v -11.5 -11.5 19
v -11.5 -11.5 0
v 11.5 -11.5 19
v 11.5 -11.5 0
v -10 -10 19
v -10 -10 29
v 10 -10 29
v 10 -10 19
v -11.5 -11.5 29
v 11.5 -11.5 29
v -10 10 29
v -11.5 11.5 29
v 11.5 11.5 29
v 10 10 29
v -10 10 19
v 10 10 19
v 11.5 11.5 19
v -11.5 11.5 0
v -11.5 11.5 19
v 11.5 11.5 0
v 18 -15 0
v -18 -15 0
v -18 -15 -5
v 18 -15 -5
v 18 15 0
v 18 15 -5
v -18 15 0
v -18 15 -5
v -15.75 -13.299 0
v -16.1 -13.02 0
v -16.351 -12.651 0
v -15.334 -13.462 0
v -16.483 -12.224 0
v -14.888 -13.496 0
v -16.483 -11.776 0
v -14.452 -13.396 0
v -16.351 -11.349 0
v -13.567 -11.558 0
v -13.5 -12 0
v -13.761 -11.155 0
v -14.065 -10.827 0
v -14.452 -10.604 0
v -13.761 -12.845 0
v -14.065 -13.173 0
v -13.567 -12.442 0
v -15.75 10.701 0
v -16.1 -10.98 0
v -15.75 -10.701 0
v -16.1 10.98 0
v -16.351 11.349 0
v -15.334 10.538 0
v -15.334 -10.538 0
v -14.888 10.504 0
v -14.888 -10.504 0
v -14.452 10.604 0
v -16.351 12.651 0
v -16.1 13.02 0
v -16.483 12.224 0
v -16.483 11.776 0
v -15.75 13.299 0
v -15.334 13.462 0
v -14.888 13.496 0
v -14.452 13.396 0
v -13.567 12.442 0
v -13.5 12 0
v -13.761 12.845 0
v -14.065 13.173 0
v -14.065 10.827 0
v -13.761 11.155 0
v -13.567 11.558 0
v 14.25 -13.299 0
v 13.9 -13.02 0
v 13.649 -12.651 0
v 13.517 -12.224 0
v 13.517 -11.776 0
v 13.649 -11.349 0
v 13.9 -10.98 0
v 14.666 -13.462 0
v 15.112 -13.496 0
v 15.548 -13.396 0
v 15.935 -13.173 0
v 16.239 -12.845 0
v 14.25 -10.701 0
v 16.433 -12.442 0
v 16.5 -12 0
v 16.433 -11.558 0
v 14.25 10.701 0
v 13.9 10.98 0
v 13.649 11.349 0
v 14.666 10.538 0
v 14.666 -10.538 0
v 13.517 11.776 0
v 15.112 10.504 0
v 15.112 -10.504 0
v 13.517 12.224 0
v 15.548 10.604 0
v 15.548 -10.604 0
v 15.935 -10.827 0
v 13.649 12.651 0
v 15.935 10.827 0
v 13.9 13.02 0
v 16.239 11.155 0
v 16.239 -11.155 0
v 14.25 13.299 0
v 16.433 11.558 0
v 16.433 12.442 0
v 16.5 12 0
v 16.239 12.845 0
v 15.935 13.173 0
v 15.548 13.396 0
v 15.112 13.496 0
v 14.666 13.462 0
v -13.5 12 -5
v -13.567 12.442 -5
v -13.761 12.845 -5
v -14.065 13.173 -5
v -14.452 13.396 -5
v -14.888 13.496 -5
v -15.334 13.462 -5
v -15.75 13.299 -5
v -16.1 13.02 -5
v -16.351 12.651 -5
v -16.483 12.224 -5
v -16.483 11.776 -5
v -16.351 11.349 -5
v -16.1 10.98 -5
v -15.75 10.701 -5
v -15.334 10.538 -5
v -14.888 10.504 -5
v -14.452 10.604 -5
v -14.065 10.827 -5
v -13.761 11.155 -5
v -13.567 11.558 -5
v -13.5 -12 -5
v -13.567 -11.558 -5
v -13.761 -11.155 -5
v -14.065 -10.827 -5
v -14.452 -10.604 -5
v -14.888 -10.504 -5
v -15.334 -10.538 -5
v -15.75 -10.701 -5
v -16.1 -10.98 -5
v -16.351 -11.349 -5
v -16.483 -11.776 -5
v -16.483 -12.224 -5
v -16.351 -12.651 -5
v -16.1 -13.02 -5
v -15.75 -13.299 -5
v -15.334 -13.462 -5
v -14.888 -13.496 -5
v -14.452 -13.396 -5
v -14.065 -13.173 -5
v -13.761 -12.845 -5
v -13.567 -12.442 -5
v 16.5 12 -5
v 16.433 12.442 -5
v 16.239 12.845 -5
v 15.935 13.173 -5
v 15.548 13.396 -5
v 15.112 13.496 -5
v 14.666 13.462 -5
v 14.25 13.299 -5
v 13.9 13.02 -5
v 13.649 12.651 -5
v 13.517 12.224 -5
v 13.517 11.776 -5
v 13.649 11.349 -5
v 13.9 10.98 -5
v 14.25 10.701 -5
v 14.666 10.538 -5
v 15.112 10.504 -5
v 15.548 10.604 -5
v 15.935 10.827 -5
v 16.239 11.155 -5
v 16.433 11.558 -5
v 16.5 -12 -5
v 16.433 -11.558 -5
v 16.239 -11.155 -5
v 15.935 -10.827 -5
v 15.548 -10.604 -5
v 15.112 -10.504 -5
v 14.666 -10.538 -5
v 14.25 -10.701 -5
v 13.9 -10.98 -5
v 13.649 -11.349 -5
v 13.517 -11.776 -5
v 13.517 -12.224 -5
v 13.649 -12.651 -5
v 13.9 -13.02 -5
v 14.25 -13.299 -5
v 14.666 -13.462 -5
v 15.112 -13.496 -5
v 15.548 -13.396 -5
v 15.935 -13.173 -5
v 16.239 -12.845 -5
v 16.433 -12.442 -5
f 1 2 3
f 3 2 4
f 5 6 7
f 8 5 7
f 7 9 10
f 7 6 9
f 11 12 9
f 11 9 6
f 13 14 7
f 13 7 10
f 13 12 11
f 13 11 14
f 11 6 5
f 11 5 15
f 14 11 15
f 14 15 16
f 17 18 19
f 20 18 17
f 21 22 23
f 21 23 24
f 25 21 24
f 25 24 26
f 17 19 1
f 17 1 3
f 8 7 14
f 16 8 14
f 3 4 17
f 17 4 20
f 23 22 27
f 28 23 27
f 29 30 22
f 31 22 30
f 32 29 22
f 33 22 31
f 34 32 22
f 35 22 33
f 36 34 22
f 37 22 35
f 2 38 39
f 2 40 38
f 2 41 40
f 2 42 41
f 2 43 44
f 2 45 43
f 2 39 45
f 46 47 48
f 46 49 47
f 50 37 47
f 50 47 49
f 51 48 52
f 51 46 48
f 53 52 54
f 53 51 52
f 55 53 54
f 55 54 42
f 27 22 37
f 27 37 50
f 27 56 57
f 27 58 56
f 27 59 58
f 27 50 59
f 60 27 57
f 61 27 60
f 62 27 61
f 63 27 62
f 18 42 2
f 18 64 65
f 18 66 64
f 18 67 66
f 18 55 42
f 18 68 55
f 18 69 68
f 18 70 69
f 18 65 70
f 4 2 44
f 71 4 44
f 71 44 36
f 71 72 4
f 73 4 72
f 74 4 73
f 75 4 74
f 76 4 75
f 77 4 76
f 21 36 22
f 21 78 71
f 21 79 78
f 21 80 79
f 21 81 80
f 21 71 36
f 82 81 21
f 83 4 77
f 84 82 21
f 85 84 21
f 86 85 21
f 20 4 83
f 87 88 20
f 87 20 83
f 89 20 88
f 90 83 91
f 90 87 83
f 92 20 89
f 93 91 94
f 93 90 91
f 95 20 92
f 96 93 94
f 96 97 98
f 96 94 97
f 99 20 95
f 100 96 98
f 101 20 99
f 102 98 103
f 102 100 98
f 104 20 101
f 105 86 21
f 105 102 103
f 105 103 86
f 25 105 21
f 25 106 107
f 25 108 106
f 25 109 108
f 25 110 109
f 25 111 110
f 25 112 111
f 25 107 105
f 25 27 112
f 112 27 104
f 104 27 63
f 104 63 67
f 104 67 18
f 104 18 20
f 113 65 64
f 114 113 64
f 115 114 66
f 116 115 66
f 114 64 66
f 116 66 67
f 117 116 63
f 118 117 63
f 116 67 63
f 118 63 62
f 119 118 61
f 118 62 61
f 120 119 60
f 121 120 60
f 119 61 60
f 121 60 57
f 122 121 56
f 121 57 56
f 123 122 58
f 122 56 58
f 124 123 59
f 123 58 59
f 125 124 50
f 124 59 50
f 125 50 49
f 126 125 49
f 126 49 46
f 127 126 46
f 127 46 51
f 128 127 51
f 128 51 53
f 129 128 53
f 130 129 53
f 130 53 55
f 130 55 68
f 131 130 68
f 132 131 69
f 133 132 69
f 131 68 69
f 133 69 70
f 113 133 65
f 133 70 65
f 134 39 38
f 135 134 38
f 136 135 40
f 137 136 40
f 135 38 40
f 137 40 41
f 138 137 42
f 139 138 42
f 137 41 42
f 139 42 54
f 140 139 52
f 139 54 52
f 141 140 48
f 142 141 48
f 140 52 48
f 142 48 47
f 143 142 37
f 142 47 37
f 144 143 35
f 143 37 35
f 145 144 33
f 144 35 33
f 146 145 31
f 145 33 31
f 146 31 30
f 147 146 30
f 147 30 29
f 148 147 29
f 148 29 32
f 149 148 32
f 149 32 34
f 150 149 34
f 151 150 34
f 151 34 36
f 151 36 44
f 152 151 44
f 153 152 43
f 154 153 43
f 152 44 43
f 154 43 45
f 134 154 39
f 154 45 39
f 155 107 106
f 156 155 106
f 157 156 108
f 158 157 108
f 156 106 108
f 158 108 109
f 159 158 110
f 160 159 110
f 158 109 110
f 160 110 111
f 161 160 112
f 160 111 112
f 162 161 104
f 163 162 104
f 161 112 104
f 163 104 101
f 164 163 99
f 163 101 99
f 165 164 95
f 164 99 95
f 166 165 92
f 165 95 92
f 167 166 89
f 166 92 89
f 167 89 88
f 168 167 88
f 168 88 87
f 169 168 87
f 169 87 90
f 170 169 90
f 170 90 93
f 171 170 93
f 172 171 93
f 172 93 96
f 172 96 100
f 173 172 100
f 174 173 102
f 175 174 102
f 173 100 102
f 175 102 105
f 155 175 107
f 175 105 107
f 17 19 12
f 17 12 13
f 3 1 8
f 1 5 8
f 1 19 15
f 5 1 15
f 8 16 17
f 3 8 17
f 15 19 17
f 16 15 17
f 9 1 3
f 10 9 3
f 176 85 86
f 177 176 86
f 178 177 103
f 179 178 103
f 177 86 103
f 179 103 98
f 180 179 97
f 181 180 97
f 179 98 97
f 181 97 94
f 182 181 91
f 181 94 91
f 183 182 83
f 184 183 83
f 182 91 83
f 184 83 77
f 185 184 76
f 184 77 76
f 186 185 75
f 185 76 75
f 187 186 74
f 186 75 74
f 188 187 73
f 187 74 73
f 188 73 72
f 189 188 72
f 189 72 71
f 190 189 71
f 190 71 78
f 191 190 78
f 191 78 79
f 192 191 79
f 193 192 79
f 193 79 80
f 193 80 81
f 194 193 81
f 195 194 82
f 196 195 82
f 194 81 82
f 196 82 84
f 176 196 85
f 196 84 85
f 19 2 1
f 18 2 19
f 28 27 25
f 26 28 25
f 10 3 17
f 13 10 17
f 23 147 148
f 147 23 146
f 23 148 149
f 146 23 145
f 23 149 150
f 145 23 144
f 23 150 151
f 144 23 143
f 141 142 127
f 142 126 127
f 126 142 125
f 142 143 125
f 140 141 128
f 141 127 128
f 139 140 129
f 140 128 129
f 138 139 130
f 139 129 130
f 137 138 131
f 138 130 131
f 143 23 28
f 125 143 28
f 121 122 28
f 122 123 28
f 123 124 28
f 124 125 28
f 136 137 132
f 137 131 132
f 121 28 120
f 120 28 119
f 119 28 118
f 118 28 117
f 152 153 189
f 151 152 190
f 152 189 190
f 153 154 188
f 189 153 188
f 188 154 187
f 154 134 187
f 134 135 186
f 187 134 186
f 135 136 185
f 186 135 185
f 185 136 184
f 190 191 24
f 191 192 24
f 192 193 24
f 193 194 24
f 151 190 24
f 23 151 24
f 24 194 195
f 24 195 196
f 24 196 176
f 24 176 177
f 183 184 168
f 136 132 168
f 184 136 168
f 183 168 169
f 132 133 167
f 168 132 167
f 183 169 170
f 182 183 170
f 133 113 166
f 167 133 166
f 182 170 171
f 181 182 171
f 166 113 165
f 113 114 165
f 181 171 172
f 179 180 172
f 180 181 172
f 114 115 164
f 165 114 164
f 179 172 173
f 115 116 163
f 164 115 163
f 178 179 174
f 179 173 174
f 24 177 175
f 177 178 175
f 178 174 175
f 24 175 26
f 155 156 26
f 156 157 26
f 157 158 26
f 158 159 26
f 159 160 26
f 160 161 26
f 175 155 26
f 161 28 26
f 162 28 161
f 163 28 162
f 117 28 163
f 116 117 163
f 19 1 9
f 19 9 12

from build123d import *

# Parameters (mm, degrees)
F0_W     = 36
F0_H     = 30
F1_DEPTH = 5
F2_W     = 23
F2_H     = 23
F3_DEPTH = 19
F4_R     = 1.5
F5_DEPTH = 5
F6_W     = 23
F6_H     = 23
F7_DEPTH = 10
F8_W     = 20
F8_H     = 20
F9_DEPTH = 10


with BuildPart() as f1:
    # F0 (on Top) → F1 (new body)
    with BuildSketch(Plane.XY):
        Rectangle(F0_W, F0_H)
    extrude(amount=-F1_DEPTH)

    # F2 (on Top) → F3 (join)
    with BuildSketch(Plane.XY):
        Rectangle(F2_W, F2_H)
    extrude(amount=F3_DEPTH)

    # F4 (on Top) → F5 (cut)
    with BuildSketch(Plane.XY):
        with Locations((-15, -12)):
            Circle(F4_R)
        with Locations((-15, 12)):
            Circle(F4_R)
        with Locations((15, 12)):
            Circle(F4_R)
        with Locations((15, -12)):
            Circle(F4_R)
    extrude(amount=-F5_DEPTH, mode=Mode.SUBTRACT)


with BuildPart() as f7:
    # F6 (on face) → F7 (new body)
    with BuildSketch(Plane.XY.offset(19)):
        Rectangle(F6_W, F6_H)
    extrude(amount=F7_DEPTH)

    # F8 (on face) → F9 (cut)
    with BuildSketch(Plane.XY.offset(29)):
        Rectangle(F8_W, F8_H)
    extrude(amount=-F9_DEPTH, mode=Mode.SUBTRACT)


solid = Compound([f1.part, f7.part])
